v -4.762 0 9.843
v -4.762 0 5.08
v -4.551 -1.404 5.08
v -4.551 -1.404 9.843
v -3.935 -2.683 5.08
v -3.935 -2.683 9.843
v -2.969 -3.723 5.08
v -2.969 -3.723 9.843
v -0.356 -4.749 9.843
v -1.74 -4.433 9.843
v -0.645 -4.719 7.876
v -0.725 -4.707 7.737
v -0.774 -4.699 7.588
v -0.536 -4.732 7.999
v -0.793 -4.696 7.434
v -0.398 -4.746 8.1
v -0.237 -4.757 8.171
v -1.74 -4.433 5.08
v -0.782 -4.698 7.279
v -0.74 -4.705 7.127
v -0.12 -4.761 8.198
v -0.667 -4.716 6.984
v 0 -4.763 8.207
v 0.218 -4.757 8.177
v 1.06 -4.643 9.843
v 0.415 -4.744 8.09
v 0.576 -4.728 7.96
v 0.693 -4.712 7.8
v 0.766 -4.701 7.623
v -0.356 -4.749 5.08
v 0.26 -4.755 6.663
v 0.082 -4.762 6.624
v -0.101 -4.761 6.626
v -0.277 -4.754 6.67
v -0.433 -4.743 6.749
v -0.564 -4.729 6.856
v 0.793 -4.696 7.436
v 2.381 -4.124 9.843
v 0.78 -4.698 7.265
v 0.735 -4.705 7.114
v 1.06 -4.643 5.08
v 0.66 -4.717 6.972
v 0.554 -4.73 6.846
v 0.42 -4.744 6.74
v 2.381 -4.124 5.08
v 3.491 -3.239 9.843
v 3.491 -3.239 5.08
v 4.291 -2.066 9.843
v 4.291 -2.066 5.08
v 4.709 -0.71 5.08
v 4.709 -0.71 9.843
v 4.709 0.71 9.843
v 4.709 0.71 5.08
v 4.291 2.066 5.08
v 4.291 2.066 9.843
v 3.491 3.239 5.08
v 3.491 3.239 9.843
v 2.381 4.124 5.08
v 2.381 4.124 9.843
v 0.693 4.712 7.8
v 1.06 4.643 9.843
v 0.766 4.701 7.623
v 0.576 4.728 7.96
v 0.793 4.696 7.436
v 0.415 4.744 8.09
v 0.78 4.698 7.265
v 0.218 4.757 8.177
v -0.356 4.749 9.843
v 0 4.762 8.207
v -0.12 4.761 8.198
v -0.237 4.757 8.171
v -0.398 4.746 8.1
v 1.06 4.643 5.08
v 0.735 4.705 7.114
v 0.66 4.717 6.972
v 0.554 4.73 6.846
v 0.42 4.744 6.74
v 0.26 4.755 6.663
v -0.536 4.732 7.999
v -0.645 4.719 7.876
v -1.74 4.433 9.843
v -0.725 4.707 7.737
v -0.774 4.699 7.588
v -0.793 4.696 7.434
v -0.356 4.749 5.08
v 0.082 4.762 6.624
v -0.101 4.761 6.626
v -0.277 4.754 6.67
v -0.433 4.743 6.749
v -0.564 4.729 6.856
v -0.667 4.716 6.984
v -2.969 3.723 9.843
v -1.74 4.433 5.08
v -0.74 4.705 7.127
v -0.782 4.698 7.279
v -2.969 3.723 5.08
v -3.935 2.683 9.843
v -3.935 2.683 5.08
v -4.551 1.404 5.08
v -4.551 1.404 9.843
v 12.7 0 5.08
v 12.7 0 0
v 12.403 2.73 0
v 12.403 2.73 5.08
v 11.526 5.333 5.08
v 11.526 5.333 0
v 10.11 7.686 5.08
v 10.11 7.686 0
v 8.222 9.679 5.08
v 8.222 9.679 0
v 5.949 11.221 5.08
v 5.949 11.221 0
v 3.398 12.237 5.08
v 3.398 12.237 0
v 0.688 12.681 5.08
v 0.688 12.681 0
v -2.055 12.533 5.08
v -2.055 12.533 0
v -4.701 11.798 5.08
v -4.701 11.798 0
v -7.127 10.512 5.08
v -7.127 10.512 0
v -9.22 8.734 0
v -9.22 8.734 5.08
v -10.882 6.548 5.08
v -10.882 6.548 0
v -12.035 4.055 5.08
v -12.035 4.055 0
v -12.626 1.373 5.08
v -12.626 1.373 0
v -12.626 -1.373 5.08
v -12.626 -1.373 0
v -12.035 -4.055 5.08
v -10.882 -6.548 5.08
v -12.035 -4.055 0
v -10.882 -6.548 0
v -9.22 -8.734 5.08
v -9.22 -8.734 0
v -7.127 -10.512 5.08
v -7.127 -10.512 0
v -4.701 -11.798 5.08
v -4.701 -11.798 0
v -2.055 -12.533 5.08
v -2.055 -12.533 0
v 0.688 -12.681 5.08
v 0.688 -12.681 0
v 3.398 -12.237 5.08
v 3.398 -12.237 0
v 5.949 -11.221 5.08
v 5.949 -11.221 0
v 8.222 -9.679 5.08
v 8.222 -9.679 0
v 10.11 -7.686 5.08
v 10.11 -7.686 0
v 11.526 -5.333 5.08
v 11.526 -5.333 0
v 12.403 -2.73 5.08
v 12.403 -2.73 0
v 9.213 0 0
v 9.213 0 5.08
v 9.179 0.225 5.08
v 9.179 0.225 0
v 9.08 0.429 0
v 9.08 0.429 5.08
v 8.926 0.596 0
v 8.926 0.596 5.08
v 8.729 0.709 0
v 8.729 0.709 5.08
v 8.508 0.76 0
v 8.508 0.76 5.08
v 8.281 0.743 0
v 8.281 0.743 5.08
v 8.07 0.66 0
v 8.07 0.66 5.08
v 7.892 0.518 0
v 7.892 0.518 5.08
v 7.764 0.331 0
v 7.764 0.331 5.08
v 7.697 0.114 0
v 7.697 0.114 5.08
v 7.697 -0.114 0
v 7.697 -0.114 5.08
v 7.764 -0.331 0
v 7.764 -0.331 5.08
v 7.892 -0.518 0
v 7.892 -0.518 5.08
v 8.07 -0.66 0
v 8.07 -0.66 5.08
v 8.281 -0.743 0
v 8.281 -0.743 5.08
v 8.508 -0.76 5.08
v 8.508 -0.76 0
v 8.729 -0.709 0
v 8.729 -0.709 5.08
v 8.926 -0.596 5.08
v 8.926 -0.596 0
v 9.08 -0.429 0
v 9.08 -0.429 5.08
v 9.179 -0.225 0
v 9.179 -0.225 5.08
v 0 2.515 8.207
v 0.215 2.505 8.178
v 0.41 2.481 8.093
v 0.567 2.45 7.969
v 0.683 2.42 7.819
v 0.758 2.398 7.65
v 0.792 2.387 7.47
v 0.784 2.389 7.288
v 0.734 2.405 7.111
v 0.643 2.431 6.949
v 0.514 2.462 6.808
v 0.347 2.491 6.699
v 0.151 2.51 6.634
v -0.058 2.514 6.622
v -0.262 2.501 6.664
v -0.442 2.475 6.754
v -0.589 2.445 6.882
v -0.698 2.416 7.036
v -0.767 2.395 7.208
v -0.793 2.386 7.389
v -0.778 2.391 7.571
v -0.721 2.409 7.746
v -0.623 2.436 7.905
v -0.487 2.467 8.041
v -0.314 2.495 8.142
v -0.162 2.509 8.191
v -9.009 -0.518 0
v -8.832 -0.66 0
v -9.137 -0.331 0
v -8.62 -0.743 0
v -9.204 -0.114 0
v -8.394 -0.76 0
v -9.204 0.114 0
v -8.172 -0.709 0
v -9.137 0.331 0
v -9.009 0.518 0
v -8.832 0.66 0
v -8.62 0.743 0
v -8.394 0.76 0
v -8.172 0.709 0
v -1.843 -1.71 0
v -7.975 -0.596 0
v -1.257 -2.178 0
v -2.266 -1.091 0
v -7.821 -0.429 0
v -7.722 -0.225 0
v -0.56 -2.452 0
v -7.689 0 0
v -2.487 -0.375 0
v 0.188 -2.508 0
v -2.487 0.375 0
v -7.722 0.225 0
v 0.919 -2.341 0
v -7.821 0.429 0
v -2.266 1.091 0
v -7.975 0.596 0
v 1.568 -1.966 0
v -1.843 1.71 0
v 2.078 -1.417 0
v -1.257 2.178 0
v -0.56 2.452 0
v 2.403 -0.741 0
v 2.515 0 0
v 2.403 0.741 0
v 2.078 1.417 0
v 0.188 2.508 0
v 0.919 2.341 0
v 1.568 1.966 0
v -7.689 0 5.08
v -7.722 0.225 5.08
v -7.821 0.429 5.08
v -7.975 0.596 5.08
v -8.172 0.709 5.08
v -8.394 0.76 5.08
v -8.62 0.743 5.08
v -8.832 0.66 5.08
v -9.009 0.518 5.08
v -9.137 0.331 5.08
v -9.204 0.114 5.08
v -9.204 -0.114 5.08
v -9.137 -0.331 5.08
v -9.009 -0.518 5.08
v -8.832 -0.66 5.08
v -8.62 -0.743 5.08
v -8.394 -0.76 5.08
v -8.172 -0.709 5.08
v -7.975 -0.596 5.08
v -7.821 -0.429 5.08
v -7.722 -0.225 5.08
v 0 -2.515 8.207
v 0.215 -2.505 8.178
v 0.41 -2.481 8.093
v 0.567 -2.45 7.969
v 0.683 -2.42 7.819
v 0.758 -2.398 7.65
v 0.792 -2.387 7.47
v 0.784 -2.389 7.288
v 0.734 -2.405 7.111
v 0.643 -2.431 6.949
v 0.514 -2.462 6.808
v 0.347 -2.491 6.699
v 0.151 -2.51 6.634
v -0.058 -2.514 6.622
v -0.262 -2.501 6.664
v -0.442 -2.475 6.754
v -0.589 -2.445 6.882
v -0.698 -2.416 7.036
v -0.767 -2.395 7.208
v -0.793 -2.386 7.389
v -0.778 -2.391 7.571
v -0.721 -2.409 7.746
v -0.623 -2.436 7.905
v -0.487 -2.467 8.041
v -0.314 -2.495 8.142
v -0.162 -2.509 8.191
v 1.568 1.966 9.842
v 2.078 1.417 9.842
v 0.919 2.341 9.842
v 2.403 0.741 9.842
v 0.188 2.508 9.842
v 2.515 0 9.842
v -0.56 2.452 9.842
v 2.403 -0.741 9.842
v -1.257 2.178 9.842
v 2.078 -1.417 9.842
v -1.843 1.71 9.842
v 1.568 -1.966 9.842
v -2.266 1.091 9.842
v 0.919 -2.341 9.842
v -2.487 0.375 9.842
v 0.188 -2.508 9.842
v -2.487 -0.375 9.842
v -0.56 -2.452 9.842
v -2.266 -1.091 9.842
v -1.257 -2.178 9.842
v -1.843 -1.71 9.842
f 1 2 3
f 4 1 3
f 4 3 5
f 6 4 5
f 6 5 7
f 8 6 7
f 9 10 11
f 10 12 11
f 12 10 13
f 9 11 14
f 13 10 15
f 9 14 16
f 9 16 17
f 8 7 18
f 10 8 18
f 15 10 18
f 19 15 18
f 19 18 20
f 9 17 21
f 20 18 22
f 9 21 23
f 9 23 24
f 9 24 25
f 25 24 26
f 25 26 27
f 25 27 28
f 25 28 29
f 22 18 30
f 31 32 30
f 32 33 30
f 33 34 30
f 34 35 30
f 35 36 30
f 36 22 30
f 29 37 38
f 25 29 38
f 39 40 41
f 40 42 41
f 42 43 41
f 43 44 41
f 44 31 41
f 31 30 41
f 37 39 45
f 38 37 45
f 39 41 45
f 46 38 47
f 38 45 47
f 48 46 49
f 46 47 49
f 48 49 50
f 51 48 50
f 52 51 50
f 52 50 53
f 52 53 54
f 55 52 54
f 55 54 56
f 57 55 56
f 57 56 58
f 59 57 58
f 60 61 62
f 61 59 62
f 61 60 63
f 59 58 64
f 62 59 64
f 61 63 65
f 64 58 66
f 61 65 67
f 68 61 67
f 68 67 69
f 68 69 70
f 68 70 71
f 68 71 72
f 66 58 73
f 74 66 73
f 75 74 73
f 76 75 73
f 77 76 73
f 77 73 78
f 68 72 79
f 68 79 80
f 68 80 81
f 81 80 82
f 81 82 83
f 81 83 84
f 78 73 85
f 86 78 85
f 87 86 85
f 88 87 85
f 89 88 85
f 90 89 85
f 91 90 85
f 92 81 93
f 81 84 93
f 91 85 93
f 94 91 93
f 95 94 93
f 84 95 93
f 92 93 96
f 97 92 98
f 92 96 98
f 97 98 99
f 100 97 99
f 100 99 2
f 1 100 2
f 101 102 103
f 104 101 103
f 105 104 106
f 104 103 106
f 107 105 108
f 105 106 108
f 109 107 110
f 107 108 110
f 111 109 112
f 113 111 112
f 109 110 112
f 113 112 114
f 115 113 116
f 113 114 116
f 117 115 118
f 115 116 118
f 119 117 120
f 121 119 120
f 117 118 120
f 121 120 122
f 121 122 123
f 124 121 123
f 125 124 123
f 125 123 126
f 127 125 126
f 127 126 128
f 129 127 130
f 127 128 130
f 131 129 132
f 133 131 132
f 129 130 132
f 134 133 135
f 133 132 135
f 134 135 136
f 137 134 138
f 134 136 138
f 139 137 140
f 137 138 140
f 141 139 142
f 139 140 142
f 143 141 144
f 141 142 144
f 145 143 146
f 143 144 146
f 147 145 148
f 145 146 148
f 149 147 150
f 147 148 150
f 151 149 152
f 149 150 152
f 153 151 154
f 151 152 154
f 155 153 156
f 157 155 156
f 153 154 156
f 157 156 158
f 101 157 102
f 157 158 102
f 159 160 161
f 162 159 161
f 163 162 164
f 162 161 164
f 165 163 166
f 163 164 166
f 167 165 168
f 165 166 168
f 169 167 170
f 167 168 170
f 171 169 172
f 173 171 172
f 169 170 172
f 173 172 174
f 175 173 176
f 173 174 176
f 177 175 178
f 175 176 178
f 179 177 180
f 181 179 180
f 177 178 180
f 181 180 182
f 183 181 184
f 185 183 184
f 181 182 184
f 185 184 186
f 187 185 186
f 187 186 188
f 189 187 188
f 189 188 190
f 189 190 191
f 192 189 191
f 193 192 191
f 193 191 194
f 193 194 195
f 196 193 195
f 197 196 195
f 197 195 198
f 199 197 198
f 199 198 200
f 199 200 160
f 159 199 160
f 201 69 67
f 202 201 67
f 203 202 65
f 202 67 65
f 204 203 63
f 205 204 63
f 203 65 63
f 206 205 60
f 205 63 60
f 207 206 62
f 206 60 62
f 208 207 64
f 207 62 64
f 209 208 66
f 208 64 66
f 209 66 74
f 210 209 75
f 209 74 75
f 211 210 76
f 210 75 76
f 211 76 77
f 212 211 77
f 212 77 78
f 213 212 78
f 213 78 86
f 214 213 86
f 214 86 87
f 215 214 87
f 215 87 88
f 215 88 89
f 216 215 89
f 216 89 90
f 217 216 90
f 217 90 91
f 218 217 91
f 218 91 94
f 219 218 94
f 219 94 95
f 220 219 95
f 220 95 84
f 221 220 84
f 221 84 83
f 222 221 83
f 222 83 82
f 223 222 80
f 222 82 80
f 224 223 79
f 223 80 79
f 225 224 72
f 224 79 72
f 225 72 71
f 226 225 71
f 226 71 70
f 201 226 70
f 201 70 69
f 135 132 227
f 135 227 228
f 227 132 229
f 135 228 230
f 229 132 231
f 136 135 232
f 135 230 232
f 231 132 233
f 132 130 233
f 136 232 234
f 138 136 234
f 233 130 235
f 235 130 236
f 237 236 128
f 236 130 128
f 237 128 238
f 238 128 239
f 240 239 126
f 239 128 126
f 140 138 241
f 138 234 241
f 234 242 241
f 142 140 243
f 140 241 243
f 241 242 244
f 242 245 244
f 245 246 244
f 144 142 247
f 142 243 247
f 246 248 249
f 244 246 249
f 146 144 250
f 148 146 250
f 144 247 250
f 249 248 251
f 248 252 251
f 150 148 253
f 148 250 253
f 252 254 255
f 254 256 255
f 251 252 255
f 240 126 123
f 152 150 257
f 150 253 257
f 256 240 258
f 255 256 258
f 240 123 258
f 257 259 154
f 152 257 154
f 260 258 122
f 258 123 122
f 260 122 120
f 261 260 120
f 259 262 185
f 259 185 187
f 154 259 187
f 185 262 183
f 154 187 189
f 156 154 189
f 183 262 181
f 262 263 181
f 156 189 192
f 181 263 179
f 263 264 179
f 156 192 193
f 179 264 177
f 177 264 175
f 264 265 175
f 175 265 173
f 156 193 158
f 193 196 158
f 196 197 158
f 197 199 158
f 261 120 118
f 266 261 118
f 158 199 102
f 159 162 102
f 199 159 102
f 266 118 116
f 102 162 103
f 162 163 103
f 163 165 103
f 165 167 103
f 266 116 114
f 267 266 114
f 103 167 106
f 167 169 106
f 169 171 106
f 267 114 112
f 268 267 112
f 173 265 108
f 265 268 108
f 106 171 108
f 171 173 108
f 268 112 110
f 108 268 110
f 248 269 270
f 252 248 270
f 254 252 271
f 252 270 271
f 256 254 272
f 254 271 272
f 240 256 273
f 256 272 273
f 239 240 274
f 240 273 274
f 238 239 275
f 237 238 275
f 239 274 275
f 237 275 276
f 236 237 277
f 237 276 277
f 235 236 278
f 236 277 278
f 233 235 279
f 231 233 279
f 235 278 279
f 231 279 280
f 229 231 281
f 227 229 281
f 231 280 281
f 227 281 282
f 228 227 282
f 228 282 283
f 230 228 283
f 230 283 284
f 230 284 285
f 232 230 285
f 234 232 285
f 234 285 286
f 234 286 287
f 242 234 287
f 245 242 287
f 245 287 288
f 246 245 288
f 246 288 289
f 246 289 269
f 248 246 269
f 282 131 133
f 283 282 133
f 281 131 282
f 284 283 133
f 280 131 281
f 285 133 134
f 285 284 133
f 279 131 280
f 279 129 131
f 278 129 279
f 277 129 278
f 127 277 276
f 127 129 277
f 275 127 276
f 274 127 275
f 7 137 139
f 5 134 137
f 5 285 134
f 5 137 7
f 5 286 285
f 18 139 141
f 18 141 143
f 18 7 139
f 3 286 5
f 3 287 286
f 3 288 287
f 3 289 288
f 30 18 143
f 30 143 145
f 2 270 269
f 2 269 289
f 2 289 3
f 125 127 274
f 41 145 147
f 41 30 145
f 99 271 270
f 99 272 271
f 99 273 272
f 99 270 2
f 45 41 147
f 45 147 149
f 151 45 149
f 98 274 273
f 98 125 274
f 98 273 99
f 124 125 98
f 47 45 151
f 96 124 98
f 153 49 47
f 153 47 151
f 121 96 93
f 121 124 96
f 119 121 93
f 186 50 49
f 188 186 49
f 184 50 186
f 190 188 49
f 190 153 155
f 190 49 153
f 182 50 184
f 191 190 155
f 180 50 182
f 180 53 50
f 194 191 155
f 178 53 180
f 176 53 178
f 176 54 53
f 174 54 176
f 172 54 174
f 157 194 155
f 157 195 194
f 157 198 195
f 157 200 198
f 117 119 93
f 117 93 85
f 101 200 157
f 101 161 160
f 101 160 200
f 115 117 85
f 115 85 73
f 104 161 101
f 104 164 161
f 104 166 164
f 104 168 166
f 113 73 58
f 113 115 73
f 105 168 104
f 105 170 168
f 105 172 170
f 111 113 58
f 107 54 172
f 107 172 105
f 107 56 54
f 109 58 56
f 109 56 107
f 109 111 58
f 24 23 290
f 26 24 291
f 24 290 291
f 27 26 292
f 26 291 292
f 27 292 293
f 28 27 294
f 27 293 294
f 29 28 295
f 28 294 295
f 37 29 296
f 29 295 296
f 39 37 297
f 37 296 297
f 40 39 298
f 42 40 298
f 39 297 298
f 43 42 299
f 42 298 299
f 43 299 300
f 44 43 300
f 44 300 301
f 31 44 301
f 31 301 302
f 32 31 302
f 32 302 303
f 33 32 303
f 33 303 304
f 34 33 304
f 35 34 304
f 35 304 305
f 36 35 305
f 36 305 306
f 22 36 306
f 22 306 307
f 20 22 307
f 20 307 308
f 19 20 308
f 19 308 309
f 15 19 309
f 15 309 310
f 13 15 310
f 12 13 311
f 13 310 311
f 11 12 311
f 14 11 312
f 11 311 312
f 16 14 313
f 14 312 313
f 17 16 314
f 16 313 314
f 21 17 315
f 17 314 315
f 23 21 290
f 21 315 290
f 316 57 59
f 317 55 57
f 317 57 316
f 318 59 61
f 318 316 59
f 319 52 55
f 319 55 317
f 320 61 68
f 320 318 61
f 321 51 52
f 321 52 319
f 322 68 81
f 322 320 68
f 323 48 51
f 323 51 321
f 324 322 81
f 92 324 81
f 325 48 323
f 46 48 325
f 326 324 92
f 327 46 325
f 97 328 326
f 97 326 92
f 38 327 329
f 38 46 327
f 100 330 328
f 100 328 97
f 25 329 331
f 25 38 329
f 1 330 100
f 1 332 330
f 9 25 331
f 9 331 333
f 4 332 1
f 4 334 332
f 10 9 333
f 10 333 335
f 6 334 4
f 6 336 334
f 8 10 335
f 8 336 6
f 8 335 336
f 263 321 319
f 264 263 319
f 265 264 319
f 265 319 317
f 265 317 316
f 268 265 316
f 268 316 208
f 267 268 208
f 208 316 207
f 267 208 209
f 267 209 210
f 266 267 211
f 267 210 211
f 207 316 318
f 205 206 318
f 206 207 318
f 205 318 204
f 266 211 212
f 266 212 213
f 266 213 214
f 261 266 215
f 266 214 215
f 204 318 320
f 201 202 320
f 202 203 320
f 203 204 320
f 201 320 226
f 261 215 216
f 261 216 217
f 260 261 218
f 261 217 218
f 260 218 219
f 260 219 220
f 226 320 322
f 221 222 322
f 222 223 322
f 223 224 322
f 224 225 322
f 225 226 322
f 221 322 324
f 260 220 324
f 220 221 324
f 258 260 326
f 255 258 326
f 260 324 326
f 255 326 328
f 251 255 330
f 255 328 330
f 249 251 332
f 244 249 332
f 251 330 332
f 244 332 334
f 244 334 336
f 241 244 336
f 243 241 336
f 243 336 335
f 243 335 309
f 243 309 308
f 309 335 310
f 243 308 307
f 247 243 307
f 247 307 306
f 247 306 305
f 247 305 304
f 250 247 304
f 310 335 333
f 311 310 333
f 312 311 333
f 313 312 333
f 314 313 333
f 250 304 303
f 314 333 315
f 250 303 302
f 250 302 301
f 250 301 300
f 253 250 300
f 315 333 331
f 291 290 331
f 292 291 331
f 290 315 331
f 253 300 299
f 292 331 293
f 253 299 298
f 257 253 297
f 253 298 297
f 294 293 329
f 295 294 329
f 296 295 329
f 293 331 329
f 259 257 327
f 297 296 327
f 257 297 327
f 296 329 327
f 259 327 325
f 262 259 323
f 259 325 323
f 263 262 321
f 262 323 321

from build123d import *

# Parameters (mm, degrees)
SKETCH1_R           = 12.7
BOSS_EXTRUDE1_DEPTH = 5.08
SKETCH2_R           = 0.762
CUT_EXTRUDE1_DEPTH  = 19.66511184
SKETCH3_R           = 4.7625
BOSS_EXTRUDE2_DEPTH = 4.7625
SKETCH4_R           = 2.5146
CUT_EXTRUDE2_DEPTH  = 21.480595847
SKETCH5_R           = 0.79375
CUT_EXTRUDE3_DEPTH  = 24.964415416


with BuildPart() as part:
    # Sketch1 → Boss-Extrude1 (new body)
    with BuildSketch(Plane.XY):
        Circle(SKETCH1_R)
    extrude(amount=BOSS_EXTRUDE1_DEPTH)

    # Sketch2 → Cut-Extrude1 (cut, through all)
    with BuildSketch(Plane.XY.offset(5.08)):
        with Locations((-8.45058, 0)):
            Circle(SKETCH2_R)
        with Locations((8.45058, 0)):
            Circle(SKETCH2_R)
    extrude(amount=-CUT_EXTRUDE1_DEPTH, mode=Mode.SUBTRACT)

    # Sketch3 → Boss-Extrude2 (add)
    with BuildSketch(Plane.XY.offset(5.08)):
        with Locations(Location((0, 0, 0), (0, 0, 180))):
            Circle(SKETCH3_R)
    extrude(amount=BOSS_EXTRUDE2_DEPTH)

    # Sketch4 → Cut-Extrude2 (cut, through all)
    with BuildSketch(Plane.XY.offset(9.8425)):
        Circle(SKETCH4_R)
    extrude(amount=-CUT_EXTRUDE2_DEPTH, mode=Mode.SUBTRACT)

    # Sketch5 → Cut-Extrude3 (cut, through all)
    with BuildSketch(Plane(origin=(0, 5.08, 0), x_dir=(1, 0, 0), z_dir=(0, 1, 0))):
        with Locations(Location((0, -7.413542721, 0), (0, 0, 270))):
            Circle(SKETCH5_R)
    extrude(amount=-CUT_EXTRUDE3_DEPTH, mode=Mode.SUBTRACT)


solid = part.part
